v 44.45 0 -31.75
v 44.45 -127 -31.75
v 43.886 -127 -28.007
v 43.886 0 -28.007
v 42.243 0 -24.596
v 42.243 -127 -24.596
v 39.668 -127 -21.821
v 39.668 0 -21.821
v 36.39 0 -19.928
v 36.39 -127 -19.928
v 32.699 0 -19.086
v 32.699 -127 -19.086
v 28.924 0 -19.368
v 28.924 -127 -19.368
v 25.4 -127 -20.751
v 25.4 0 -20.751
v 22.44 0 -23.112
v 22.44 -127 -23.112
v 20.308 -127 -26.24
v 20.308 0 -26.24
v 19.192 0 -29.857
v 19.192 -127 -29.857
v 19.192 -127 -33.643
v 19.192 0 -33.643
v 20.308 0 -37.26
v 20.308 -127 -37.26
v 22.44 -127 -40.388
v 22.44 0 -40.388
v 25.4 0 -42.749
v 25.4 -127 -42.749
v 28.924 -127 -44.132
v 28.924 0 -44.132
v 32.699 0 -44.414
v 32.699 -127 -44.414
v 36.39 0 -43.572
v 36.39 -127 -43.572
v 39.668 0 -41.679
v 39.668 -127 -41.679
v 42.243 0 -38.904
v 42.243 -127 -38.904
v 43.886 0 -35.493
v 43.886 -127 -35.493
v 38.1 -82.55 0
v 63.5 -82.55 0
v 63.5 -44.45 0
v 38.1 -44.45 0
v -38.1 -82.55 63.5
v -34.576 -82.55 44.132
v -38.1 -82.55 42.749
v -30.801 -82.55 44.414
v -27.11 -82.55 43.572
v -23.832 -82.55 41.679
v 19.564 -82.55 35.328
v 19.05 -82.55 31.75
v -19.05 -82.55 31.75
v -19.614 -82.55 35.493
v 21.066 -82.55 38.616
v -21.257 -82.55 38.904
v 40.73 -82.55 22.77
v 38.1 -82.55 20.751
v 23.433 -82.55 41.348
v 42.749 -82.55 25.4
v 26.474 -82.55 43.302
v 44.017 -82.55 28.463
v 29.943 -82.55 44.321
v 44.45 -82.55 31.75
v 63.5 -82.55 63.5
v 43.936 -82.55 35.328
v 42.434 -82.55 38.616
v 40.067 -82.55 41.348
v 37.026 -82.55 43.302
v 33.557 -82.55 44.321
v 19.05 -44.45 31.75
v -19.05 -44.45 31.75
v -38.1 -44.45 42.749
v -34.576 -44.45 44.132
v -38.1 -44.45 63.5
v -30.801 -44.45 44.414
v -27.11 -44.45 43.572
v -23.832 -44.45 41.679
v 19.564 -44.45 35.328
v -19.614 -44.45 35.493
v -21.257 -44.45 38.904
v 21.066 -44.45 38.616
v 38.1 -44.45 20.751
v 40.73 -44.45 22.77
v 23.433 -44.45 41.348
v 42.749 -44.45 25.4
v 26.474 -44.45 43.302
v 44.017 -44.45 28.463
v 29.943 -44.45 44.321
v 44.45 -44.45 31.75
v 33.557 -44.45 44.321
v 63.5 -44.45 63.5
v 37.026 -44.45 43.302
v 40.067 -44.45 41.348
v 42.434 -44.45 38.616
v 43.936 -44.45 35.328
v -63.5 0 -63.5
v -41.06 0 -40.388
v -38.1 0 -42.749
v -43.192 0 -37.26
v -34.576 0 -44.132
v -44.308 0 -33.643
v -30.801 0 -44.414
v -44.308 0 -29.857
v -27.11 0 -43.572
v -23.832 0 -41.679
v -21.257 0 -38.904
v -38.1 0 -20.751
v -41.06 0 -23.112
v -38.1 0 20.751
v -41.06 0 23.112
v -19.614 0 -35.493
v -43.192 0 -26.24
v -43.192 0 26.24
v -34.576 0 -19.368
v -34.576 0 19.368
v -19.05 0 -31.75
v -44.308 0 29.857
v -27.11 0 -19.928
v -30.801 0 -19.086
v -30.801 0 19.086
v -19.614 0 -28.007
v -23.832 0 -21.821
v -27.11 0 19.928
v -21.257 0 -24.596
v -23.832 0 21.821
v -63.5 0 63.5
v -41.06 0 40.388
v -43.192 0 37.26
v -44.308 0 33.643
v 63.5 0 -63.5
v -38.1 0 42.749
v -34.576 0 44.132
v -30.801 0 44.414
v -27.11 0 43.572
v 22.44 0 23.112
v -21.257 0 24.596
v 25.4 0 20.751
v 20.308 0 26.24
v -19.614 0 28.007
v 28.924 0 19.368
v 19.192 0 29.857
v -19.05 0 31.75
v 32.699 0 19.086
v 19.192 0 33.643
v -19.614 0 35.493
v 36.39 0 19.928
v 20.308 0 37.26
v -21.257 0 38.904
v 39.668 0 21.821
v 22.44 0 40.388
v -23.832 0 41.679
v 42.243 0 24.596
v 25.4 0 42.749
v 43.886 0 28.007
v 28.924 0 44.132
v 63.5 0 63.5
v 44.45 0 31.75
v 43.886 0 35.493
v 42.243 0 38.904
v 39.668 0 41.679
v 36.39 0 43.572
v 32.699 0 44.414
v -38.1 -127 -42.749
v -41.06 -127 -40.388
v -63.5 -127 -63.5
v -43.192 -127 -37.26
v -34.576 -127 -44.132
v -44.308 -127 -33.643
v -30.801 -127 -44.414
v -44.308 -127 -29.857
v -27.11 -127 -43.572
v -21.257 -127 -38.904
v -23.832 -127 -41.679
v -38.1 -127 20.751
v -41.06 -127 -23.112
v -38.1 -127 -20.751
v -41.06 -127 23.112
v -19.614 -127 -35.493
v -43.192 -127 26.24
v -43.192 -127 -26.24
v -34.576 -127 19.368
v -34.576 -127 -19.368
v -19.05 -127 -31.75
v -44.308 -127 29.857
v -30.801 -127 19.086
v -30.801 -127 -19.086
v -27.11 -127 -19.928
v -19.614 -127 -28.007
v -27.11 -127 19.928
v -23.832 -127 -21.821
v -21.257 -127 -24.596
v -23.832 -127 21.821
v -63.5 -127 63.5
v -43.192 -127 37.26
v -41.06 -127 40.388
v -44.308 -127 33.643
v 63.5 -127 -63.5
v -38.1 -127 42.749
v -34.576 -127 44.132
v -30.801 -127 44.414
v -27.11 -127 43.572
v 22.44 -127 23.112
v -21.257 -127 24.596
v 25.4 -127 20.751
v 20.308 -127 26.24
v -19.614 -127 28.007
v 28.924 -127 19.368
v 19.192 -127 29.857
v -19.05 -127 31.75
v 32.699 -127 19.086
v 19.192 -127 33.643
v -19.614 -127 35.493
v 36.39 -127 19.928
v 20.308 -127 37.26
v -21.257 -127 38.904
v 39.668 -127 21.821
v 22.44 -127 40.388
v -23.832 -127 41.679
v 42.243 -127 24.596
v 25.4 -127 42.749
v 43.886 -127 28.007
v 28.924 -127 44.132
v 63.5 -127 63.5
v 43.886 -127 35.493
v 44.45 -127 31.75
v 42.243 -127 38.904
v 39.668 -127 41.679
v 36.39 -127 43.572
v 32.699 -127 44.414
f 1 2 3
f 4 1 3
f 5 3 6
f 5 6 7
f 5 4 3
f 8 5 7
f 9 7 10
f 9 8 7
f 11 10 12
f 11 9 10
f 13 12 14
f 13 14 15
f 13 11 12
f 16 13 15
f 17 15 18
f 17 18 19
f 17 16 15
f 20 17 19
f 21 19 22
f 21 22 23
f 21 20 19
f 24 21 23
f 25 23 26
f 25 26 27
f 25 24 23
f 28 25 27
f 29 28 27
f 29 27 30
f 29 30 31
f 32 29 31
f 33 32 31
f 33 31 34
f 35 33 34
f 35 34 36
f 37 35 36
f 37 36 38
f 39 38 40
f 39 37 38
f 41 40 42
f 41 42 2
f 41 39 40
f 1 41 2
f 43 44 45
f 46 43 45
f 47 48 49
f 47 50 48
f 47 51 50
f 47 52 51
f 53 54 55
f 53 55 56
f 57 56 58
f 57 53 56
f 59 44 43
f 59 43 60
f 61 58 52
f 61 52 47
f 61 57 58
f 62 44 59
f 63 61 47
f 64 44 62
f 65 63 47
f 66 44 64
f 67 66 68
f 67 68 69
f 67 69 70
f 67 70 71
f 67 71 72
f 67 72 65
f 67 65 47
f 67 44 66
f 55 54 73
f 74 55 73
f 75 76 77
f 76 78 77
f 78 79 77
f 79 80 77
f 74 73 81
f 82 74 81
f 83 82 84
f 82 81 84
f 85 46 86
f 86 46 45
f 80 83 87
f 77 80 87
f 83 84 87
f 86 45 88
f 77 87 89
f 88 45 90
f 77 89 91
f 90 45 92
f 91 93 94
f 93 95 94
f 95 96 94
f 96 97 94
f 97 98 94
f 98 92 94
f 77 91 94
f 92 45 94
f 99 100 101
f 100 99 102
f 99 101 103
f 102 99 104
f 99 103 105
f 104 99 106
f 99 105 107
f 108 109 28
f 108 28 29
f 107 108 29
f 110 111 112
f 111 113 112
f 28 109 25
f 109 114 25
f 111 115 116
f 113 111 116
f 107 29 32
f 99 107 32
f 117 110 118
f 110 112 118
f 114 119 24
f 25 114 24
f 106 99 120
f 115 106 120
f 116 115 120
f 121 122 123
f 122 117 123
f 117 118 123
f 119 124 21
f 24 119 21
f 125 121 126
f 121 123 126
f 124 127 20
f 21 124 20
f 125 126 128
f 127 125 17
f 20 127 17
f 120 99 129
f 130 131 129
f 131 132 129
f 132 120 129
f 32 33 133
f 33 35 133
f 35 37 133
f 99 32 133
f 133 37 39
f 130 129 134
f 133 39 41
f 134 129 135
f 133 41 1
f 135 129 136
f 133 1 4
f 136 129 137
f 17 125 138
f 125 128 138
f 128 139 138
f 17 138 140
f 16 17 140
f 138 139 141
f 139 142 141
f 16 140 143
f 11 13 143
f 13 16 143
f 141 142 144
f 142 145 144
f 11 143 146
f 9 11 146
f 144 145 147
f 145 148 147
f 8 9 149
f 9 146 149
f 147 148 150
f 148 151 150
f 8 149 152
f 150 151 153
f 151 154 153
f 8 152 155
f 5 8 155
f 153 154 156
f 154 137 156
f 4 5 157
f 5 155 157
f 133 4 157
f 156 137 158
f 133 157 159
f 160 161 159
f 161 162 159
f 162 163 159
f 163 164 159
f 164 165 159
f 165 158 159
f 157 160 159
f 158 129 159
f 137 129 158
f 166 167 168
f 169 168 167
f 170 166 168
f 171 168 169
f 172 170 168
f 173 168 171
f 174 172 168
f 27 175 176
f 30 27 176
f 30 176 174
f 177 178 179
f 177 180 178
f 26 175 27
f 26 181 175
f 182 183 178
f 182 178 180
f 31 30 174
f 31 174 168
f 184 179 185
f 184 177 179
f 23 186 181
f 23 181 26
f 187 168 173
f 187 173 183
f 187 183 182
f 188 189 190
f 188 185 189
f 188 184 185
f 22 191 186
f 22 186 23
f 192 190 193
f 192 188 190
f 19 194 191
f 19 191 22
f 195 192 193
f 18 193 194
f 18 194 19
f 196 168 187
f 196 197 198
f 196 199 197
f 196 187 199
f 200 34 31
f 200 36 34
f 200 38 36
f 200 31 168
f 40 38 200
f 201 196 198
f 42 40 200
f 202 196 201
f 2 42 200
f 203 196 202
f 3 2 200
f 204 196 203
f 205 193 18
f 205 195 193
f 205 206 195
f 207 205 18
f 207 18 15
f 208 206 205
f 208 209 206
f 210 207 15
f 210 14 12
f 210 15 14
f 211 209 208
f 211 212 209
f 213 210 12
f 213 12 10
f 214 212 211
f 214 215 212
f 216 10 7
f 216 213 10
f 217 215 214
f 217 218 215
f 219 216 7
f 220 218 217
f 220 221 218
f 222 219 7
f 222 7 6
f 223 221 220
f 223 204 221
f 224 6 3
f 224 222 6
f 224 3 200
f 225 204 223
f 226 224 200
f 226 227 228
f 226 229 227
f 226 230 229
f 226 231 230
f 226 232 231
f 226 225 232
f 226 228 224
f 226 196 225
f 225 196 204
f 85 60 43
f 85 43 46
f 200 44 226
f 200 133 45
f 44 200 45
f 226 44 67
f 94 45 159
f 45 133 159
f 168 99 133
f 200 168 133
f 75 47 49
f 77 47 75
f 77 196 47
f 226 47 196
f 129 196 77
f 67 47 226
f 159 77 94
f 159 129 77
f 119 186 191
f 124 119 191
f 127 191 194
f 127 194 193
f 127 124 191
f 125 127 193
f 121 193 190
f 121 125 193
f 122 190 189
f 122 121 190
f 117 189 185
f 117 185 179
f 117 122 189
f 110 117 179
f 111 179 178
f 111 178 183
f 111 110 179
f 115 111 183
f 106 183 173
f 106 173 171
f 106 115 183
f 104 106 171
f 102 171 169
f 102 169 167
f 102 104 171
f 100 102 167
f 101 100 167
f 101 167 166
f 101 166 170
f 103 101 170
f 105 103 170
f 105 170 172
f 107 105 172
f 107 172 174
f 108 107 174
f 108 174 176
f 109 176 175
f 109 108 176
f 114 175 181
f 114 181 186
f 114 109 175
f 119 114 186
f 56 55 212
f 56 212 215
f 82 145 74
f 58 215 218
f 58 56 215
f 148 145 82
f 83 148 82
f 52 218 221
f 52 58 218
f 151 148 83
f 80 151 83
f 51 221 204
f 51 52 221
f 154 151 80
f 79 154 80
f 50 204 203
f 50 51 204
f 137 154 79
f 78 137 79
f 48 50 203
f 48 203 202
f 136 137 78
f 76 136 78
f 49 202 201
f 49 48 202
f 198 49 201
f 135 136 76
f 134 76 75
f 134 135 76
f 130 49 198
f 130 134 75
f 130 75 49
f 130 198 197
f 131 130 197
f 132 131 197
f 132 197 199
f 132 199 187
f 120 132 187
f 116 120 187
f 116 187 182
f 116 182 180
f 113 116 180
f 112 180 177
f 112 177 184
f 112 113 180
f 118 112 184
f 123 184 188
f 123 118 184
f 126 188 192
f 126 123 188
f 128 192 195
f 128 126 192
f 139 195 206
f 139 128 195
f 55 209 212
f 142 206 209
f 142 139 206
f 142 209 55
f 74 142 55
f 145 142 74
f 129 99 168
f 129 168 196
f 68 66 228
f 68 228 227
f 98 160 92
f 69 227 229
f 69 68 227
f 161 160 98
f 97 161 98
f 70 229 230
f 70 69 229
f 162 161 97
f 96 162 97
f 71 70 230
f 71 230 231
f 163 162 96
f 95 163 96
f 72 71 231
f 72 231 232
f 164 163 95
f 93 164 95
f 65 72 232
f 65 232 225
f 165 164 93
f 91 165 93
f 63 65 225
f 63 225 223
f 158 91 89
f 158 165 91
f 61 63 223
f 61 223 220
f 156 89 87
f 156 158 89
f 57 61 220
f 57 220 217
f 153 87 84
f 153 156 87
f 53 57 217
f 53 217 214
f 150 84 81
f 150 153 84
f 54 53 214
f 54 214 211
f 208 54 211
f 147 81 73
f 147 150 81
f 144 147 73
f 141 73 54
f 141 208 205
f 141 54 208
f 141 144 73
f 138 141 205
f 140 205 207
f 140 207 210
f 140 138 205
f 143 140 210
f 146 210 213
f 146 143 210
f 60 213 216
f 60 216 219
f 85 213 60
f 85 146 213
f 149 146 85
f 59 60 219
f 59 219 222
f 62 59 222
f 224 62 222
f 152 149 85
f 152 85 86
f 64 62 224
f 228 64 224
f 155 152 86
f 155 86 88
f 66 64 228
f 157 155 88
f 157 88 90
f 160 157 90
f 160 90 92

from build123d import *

# Parameters (mm, degrees)
F0_W     = 127
F0_H     = 127
F0_R     = 12.7
F1_DEPTH = 127
F2_W     = 38.1
F2_H     = 63.5
F3_DEPTH = 25.4
F4_W     = 38.1
F4_H     = 31.75
F5_DEPTH = 76.2


with BuildPart() as f1:
    # F0 (on Front) → F1 (new body)
    with BuildSketch(Plane.XZ):
        Rectangle(F0_W, F0_H)
        with Locations((-31.75, -31.75)):
            Circle(F0_R, mode=Mode.SUBTRACT)
        with Locations((31.75, -31.75)):
            Circle(F0_R, mode=Mode.SUBTRACT)
        with Locations((-31.75, 31.75)):
            Circle(F0_R, mode=Mode.SUBTRACT)
        with Locations((31.75, 31.75)):
            Circle(F0_R, mode=Mode.SUBTRACT)
    extrude(amount=F1_DEPTH)

    # F2 (on face) → F3 (cut)
    with BuildSketch(Plane.YZ.offset(63.5)):
        with Locations((-63.5, 31.75)):
            Rectangle(F2_W, F2_H)
    extrude(amount=-F3_DEPTH, mode=Mode.SUBTRACT)

    # F4 (on face) → F5 (cut)
    with BuildSketch(Plane.YZ.offset(38.1)):
        with Locations((-63.5, 47.625)):
            Rectangle(F4_W, F4_H)
    extrude(amount=-F5_DEPTH, mode=Mode.SUBTRACT)


solid = f1.part
